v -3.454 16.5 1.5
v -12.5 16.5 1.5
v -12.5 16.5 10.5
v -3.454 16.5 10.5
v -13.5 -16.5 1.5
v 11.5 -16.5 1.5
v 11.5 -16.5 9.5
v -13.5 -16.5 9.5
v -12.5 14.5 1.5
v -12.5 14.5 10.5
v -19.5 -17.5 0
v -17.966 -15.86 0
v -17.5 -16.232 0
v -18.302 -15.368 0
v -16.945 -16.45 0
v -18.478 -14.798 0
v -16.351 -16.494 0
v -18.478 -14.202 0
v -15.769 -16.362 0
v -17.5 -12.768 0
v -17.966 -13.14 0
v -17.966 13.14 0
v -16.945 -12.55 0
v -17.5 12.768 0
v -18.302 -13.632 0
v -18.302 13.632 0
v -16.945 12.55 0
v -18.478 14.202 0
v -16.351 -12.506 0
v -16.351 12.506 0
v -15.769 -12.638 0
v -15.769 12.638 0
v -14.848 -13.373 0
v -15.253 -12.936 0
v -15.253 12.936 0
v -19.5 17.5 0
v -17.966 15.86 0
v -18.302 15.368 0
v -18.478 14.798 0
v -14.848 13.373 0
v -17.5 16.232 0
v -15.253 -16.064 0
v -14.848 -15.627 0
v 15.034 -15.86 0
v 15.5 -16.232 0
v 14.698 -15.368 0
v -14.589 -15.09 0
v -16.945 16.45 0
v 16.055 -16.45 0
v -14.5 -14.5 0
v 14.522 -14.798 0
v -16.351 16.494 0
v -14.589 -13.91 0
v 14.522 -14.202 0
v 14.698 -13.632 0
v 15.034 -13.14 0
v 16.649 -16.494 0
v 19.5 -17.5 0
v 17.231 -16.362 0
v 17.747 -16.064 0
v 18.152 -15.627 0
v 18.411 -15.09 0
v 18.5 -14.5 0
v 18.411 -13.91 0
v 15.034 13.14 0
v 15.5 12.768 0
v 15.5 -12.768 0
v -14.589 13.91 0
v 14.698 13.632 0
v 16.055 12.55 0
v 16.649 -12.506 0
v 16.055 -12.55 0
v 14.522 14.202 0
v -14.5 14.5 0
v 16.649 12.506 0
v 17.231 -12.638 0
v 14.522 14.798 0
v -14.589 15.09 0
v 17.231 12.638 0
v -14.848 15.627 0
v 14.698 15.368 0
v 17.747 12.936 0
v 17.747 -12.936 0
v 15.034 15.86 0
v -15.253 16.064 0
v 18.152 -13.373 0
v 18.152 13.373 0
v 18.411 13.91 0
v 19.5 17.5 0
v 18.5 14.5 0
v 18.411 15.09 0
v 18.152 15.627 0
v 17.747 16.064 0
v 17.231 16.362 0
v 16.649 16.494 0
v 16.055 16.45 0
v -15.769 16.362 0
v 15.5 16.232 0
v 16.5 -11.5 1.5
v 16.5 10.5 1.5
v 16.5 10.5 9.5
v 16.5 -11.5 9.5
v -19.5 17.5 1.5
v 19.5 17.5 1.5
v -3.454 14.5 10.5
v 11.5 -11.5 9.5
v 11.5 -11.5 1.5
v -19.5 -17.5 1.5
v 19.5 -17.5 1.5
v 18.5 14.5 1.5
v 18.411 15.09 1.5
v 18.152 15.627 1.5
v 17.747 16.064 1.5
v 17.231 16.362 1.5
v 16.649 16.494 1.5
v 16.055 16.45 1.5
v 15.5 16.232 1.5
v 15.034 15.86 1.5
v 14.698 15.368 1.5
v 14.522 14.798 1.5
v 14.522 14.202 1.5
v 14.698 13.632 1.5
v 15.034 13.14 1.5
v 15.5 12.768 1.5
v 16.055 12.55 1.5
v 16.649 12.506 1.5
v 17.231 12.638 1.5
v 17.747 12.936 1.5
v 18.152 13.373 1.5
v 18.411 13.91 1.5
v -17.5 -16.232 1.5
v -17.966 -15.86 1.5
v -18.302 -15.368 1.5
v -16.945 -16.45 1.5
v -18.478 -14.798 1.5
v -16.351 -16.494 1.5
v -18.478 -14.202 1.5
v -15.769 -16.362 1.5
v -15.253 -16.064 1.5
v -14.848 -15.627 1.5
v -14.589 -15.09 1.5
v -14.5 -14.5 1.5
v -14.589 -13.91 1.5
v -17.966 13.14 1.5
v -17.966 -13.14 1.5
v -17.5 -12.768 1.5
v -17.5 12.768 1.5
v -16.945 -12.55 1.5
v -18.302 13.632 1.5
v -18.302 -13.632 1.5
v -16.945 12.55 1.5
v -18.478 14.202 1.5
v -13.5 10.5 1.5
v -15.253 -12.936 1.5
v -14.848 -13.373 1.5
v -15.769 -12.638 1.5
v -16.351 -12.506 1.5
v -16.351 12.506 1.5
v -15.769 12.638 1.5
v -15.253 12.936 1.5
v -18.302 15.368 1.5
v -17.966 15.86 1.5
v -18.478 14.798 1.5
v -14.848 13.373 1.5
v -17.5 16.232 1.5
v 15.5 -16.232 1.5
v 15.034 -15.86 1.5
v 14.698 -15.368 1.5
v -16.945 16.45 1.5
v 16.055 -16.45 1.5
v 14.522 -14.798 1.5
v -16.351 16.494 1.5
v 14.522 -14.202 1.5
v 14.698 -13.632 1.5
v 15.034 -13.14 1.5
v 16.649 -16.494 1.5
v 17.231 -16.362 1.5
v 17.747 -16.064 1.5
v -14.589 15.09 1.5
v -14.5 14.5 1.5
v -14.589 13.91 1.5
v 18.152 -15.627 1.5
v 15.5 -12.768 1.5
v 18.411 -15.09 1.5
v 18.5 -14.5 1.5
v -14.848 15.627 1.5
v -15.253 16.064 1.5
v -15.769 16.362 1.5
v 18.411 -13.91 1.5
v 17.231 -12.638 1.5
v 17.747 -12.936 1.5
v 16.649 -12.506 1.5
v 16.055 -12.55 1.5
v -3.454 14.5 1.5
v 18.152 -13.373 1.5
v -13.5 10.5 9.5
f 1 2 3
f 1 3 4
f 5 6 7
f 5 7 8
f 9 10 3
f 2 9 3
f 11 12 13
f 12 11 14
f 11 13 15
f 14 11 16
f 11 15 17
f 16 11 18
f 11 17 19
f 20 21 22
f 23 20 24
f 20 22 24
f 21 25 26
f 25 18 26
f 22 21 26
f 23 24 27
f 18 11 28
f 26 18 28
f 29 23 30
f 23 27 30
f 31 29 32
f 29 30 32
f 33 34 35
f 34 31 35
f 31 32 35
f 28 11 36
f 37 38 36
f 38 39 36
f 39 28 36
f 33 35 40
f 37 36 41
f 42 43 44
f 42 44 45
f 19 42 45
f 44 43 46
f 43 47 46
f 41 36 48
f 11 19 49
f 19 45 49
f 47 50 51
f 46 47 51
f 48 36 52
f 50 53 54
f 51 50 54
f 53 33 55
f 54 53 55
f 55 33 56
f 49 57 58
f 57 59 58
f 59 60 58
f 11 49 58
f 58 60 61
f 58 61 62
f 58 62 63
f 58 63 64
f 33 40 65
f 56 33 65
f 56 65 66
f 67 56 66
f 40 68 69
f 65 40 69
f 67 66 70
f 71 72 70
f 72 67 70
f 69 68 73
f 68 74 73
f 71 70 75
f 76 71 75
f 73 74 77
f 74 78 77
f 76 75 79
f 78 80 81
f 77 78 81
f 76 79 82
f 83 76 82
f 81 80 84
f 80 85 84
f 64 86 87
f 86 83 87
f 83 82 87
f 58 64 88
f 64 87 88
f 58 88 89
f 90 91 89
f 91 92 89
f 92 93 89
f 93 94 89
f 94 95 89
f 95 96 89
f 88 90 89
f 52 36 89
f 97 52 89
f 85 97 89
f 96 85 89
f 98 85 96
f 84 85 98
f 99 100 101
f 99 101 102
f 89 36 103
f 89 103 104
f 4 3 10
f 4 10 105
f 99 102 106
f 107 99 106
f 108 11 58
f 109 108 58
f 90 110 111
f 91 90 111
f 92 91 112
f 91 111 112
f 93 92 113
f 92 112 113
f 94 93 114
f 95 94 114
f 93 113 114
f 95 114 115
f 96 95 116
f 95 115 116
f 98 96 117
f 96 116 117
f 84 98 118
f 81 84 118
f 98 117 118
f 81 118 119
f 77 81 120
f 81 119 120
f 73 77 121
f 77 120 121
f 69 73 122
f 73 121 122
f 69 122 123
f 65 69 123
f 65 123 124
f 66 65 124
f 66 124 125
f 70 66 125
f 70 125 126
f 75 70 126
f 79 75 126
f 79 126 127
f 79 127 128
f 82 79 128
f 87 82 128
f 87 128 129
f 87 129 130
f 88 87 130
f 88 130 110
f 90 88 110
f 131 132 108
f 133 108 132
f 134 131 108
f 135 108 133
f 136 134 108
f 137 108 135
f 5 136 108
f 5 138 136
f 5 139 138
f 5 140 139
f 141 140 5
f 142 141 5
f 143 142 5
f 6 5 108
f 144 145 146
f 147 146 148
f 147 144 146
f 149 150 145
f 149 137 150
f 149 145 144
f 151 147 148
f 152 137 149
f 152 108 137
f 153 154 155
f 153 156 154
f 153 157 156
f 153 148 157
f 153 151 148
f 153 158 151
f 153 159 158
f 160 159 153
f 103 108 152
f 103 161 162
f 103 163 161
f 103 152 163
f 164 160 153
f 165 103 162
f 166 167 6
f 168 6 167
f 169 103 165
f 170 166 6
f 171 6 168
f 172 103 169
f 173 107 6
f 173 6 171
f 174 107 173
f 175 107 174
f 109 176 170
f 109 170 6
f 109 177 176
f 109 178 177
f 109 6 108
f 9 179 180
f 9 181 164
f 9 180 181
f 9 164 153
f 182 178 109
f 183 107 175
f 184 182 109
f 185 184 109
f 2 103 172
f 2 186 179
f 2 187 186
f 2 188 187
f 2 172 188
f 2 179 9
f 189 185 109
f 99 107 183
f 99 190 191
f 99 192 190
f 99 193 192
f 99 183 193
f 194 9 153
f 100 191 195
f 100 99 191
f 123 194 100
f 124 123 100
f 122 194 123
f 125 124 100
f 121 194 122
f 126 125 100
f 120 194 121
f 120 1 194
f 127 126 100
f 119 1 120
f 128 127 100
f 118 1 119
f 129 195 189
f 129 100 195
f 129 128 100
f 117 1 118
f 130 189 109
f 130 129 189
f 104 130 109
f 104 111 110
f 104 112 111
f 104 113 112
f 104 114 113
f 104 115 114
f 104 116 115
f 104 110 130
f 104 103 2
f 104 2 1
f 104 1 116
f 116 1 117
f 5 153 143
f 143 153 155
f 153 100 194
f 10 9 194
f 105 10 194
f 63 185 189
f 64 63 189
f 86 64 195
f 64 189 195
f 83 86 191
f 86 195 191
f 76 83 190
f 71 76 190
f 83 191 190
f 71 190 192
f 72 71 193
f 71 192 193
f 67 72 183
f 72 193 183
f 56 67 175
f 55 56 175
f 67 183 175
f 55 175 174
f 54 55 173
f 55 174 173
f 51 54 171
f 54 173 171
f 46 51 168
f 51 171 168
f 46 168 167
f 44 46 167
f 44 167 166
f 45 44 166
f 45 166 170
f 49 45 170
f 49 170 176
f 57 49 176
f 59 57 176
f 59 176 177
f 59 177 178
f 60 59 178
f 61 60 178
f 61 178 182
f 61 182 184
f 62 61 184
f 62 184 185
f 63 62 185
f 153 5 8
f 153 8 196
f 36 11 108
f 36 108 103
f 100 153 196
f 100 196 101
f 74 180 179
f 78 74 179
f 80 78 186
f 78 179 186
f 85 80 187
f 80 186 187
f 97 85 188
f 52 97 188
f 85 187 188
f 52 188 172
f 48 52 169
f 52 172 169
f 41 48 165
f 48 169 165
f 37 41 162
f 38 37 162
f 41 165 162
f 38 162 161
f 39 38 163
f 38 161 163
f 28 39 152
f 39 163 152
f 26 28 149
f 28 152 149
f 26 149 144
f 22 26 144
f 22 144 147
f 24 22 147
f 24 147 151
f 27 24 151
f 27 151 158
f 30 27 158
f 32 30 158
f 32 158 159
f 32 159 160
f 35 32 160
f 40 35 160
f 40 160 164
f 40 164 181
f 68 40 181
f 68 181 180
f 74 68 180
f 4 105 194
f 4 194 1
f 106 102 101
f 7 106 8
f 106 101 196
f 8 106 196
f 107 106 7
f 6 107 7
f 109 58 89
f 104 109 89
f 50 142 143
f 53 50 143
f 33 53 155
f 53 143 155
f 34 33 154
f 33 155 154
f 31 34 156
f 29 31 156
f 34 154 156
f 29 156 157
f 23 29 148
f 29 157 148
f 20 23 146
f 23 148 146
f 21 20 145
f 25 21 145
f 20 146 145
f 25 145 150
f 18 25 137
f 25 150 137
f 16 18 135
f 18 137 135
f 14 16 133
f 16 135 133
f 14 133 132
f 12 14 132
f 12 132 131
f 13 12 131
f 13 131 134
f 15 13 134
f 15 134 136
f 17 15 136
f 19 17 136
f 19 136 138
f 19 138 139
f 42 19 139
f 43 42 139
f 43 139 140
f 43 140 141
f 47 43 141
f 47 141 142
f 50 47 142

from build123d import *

# Parameters (mm, degrees)
ESQUISSE1_W                     = 39
ESQUISSE1_H                     = 35
BOSS_EXTRU_1_DEPTH              = 1.5
ENL_V_MAT_EXTRU_1_REACH         = 28.244
ESQUISSE2_R                     = 2
R_P_TITION_LIN_AIRE1_COUNT      = 2
R_P_TITION_LIN_AIRE1_PITCH      = 33
R_P_TITION_LIN_AIRE1_COUNT_DIR2 = 2
R_P_TITION_LIN_AIRE1_PITCH_DIR2 = 29
ESQUISSE3_W                     = 9.045882094
ESQUISSE3_H                     = 2
BOSS_EXTRU_2_DEPTH              = 9
BOSS_EXTRU_3_DEPTH              = 8


with BuildPart() as part:
    # Esquisse1 → Boss.-Extru.1 (new body)
    with BuildSketch(Plane.XY):
        Rectangle(ESQUISSE1_W, ESQUISSE1_H)
    extrude(amount=BOSS_EXTRU_1_DEPTH)

    # Esquisse2 → Enlèv. mat.-Extru.1 (cut, up to next)
    with BuildSketch(Plane.XY.offset(1.5), mode=Mode.PRIVATE) as enl_v_mat_extru_1_sk1:
        with Locations((16.5, 14.5)):
            Circle(ESQUISSE2_R)
    enl_v_mat_extru_1_tool1 = extrude(enl_v_mat_extru_1_sk1.sketch, amount=-ENL_V_MAT_EXTRU_1_REACH, mode=Mode.PRIVATE) & part.part
    enl_v_mat_extru_1 = enl_v_mat_extru_1_tool1.solids().sort_by_distance((16.5, 14.5, 1.5))[0]
    add(enl_v_mat_extru_1, mode=Mode.SUBTRACT)

    # Répétition linéaire1: Enl_v. mat.-Extru.1 2 × 2
    with Locations(*[(-i * R_P_TITION_LIN_AIRE1_PITCH, -j * R_P_TITION_LIN_AIRE1_PITCH_DIR2, 0) for i in range(R_P_TITION_LIN_AIRE1_COUNT) for j in range(R_P_TITION_LIN_AIRE1_COUNT_DIR2) if (i, j) != (0, 0)]):
        add(enl_v_mat_extru_1, mode=Mode.SUBTRACT)

    # Esquisse3 → Boss.-Extru.2 (add)
    with BuildSketch(Plane.XY.offset(1.5)):
        with Locations((-7.977058953, 15.5)):
            Rectangle(ESQUISSE3_W, ESQUISSE3_H)
    extrude(amount=BOSS_EXTRU_2_DEPTH)

    # Esquisse4 → Boss.-Extru.3 (add)
    with BuildSketch(Plane.XY.offset(1.5)):
        Polygon((-13.5, 10.5), (16.5, 10.5), (16.5, -11.5), (11.5, -11.5), (11.5, -16.5), (-13.5, -16.5), align=None)
    extrude(amount=BOSS_EXTRU_3_DEPTH)


solid = part.part
